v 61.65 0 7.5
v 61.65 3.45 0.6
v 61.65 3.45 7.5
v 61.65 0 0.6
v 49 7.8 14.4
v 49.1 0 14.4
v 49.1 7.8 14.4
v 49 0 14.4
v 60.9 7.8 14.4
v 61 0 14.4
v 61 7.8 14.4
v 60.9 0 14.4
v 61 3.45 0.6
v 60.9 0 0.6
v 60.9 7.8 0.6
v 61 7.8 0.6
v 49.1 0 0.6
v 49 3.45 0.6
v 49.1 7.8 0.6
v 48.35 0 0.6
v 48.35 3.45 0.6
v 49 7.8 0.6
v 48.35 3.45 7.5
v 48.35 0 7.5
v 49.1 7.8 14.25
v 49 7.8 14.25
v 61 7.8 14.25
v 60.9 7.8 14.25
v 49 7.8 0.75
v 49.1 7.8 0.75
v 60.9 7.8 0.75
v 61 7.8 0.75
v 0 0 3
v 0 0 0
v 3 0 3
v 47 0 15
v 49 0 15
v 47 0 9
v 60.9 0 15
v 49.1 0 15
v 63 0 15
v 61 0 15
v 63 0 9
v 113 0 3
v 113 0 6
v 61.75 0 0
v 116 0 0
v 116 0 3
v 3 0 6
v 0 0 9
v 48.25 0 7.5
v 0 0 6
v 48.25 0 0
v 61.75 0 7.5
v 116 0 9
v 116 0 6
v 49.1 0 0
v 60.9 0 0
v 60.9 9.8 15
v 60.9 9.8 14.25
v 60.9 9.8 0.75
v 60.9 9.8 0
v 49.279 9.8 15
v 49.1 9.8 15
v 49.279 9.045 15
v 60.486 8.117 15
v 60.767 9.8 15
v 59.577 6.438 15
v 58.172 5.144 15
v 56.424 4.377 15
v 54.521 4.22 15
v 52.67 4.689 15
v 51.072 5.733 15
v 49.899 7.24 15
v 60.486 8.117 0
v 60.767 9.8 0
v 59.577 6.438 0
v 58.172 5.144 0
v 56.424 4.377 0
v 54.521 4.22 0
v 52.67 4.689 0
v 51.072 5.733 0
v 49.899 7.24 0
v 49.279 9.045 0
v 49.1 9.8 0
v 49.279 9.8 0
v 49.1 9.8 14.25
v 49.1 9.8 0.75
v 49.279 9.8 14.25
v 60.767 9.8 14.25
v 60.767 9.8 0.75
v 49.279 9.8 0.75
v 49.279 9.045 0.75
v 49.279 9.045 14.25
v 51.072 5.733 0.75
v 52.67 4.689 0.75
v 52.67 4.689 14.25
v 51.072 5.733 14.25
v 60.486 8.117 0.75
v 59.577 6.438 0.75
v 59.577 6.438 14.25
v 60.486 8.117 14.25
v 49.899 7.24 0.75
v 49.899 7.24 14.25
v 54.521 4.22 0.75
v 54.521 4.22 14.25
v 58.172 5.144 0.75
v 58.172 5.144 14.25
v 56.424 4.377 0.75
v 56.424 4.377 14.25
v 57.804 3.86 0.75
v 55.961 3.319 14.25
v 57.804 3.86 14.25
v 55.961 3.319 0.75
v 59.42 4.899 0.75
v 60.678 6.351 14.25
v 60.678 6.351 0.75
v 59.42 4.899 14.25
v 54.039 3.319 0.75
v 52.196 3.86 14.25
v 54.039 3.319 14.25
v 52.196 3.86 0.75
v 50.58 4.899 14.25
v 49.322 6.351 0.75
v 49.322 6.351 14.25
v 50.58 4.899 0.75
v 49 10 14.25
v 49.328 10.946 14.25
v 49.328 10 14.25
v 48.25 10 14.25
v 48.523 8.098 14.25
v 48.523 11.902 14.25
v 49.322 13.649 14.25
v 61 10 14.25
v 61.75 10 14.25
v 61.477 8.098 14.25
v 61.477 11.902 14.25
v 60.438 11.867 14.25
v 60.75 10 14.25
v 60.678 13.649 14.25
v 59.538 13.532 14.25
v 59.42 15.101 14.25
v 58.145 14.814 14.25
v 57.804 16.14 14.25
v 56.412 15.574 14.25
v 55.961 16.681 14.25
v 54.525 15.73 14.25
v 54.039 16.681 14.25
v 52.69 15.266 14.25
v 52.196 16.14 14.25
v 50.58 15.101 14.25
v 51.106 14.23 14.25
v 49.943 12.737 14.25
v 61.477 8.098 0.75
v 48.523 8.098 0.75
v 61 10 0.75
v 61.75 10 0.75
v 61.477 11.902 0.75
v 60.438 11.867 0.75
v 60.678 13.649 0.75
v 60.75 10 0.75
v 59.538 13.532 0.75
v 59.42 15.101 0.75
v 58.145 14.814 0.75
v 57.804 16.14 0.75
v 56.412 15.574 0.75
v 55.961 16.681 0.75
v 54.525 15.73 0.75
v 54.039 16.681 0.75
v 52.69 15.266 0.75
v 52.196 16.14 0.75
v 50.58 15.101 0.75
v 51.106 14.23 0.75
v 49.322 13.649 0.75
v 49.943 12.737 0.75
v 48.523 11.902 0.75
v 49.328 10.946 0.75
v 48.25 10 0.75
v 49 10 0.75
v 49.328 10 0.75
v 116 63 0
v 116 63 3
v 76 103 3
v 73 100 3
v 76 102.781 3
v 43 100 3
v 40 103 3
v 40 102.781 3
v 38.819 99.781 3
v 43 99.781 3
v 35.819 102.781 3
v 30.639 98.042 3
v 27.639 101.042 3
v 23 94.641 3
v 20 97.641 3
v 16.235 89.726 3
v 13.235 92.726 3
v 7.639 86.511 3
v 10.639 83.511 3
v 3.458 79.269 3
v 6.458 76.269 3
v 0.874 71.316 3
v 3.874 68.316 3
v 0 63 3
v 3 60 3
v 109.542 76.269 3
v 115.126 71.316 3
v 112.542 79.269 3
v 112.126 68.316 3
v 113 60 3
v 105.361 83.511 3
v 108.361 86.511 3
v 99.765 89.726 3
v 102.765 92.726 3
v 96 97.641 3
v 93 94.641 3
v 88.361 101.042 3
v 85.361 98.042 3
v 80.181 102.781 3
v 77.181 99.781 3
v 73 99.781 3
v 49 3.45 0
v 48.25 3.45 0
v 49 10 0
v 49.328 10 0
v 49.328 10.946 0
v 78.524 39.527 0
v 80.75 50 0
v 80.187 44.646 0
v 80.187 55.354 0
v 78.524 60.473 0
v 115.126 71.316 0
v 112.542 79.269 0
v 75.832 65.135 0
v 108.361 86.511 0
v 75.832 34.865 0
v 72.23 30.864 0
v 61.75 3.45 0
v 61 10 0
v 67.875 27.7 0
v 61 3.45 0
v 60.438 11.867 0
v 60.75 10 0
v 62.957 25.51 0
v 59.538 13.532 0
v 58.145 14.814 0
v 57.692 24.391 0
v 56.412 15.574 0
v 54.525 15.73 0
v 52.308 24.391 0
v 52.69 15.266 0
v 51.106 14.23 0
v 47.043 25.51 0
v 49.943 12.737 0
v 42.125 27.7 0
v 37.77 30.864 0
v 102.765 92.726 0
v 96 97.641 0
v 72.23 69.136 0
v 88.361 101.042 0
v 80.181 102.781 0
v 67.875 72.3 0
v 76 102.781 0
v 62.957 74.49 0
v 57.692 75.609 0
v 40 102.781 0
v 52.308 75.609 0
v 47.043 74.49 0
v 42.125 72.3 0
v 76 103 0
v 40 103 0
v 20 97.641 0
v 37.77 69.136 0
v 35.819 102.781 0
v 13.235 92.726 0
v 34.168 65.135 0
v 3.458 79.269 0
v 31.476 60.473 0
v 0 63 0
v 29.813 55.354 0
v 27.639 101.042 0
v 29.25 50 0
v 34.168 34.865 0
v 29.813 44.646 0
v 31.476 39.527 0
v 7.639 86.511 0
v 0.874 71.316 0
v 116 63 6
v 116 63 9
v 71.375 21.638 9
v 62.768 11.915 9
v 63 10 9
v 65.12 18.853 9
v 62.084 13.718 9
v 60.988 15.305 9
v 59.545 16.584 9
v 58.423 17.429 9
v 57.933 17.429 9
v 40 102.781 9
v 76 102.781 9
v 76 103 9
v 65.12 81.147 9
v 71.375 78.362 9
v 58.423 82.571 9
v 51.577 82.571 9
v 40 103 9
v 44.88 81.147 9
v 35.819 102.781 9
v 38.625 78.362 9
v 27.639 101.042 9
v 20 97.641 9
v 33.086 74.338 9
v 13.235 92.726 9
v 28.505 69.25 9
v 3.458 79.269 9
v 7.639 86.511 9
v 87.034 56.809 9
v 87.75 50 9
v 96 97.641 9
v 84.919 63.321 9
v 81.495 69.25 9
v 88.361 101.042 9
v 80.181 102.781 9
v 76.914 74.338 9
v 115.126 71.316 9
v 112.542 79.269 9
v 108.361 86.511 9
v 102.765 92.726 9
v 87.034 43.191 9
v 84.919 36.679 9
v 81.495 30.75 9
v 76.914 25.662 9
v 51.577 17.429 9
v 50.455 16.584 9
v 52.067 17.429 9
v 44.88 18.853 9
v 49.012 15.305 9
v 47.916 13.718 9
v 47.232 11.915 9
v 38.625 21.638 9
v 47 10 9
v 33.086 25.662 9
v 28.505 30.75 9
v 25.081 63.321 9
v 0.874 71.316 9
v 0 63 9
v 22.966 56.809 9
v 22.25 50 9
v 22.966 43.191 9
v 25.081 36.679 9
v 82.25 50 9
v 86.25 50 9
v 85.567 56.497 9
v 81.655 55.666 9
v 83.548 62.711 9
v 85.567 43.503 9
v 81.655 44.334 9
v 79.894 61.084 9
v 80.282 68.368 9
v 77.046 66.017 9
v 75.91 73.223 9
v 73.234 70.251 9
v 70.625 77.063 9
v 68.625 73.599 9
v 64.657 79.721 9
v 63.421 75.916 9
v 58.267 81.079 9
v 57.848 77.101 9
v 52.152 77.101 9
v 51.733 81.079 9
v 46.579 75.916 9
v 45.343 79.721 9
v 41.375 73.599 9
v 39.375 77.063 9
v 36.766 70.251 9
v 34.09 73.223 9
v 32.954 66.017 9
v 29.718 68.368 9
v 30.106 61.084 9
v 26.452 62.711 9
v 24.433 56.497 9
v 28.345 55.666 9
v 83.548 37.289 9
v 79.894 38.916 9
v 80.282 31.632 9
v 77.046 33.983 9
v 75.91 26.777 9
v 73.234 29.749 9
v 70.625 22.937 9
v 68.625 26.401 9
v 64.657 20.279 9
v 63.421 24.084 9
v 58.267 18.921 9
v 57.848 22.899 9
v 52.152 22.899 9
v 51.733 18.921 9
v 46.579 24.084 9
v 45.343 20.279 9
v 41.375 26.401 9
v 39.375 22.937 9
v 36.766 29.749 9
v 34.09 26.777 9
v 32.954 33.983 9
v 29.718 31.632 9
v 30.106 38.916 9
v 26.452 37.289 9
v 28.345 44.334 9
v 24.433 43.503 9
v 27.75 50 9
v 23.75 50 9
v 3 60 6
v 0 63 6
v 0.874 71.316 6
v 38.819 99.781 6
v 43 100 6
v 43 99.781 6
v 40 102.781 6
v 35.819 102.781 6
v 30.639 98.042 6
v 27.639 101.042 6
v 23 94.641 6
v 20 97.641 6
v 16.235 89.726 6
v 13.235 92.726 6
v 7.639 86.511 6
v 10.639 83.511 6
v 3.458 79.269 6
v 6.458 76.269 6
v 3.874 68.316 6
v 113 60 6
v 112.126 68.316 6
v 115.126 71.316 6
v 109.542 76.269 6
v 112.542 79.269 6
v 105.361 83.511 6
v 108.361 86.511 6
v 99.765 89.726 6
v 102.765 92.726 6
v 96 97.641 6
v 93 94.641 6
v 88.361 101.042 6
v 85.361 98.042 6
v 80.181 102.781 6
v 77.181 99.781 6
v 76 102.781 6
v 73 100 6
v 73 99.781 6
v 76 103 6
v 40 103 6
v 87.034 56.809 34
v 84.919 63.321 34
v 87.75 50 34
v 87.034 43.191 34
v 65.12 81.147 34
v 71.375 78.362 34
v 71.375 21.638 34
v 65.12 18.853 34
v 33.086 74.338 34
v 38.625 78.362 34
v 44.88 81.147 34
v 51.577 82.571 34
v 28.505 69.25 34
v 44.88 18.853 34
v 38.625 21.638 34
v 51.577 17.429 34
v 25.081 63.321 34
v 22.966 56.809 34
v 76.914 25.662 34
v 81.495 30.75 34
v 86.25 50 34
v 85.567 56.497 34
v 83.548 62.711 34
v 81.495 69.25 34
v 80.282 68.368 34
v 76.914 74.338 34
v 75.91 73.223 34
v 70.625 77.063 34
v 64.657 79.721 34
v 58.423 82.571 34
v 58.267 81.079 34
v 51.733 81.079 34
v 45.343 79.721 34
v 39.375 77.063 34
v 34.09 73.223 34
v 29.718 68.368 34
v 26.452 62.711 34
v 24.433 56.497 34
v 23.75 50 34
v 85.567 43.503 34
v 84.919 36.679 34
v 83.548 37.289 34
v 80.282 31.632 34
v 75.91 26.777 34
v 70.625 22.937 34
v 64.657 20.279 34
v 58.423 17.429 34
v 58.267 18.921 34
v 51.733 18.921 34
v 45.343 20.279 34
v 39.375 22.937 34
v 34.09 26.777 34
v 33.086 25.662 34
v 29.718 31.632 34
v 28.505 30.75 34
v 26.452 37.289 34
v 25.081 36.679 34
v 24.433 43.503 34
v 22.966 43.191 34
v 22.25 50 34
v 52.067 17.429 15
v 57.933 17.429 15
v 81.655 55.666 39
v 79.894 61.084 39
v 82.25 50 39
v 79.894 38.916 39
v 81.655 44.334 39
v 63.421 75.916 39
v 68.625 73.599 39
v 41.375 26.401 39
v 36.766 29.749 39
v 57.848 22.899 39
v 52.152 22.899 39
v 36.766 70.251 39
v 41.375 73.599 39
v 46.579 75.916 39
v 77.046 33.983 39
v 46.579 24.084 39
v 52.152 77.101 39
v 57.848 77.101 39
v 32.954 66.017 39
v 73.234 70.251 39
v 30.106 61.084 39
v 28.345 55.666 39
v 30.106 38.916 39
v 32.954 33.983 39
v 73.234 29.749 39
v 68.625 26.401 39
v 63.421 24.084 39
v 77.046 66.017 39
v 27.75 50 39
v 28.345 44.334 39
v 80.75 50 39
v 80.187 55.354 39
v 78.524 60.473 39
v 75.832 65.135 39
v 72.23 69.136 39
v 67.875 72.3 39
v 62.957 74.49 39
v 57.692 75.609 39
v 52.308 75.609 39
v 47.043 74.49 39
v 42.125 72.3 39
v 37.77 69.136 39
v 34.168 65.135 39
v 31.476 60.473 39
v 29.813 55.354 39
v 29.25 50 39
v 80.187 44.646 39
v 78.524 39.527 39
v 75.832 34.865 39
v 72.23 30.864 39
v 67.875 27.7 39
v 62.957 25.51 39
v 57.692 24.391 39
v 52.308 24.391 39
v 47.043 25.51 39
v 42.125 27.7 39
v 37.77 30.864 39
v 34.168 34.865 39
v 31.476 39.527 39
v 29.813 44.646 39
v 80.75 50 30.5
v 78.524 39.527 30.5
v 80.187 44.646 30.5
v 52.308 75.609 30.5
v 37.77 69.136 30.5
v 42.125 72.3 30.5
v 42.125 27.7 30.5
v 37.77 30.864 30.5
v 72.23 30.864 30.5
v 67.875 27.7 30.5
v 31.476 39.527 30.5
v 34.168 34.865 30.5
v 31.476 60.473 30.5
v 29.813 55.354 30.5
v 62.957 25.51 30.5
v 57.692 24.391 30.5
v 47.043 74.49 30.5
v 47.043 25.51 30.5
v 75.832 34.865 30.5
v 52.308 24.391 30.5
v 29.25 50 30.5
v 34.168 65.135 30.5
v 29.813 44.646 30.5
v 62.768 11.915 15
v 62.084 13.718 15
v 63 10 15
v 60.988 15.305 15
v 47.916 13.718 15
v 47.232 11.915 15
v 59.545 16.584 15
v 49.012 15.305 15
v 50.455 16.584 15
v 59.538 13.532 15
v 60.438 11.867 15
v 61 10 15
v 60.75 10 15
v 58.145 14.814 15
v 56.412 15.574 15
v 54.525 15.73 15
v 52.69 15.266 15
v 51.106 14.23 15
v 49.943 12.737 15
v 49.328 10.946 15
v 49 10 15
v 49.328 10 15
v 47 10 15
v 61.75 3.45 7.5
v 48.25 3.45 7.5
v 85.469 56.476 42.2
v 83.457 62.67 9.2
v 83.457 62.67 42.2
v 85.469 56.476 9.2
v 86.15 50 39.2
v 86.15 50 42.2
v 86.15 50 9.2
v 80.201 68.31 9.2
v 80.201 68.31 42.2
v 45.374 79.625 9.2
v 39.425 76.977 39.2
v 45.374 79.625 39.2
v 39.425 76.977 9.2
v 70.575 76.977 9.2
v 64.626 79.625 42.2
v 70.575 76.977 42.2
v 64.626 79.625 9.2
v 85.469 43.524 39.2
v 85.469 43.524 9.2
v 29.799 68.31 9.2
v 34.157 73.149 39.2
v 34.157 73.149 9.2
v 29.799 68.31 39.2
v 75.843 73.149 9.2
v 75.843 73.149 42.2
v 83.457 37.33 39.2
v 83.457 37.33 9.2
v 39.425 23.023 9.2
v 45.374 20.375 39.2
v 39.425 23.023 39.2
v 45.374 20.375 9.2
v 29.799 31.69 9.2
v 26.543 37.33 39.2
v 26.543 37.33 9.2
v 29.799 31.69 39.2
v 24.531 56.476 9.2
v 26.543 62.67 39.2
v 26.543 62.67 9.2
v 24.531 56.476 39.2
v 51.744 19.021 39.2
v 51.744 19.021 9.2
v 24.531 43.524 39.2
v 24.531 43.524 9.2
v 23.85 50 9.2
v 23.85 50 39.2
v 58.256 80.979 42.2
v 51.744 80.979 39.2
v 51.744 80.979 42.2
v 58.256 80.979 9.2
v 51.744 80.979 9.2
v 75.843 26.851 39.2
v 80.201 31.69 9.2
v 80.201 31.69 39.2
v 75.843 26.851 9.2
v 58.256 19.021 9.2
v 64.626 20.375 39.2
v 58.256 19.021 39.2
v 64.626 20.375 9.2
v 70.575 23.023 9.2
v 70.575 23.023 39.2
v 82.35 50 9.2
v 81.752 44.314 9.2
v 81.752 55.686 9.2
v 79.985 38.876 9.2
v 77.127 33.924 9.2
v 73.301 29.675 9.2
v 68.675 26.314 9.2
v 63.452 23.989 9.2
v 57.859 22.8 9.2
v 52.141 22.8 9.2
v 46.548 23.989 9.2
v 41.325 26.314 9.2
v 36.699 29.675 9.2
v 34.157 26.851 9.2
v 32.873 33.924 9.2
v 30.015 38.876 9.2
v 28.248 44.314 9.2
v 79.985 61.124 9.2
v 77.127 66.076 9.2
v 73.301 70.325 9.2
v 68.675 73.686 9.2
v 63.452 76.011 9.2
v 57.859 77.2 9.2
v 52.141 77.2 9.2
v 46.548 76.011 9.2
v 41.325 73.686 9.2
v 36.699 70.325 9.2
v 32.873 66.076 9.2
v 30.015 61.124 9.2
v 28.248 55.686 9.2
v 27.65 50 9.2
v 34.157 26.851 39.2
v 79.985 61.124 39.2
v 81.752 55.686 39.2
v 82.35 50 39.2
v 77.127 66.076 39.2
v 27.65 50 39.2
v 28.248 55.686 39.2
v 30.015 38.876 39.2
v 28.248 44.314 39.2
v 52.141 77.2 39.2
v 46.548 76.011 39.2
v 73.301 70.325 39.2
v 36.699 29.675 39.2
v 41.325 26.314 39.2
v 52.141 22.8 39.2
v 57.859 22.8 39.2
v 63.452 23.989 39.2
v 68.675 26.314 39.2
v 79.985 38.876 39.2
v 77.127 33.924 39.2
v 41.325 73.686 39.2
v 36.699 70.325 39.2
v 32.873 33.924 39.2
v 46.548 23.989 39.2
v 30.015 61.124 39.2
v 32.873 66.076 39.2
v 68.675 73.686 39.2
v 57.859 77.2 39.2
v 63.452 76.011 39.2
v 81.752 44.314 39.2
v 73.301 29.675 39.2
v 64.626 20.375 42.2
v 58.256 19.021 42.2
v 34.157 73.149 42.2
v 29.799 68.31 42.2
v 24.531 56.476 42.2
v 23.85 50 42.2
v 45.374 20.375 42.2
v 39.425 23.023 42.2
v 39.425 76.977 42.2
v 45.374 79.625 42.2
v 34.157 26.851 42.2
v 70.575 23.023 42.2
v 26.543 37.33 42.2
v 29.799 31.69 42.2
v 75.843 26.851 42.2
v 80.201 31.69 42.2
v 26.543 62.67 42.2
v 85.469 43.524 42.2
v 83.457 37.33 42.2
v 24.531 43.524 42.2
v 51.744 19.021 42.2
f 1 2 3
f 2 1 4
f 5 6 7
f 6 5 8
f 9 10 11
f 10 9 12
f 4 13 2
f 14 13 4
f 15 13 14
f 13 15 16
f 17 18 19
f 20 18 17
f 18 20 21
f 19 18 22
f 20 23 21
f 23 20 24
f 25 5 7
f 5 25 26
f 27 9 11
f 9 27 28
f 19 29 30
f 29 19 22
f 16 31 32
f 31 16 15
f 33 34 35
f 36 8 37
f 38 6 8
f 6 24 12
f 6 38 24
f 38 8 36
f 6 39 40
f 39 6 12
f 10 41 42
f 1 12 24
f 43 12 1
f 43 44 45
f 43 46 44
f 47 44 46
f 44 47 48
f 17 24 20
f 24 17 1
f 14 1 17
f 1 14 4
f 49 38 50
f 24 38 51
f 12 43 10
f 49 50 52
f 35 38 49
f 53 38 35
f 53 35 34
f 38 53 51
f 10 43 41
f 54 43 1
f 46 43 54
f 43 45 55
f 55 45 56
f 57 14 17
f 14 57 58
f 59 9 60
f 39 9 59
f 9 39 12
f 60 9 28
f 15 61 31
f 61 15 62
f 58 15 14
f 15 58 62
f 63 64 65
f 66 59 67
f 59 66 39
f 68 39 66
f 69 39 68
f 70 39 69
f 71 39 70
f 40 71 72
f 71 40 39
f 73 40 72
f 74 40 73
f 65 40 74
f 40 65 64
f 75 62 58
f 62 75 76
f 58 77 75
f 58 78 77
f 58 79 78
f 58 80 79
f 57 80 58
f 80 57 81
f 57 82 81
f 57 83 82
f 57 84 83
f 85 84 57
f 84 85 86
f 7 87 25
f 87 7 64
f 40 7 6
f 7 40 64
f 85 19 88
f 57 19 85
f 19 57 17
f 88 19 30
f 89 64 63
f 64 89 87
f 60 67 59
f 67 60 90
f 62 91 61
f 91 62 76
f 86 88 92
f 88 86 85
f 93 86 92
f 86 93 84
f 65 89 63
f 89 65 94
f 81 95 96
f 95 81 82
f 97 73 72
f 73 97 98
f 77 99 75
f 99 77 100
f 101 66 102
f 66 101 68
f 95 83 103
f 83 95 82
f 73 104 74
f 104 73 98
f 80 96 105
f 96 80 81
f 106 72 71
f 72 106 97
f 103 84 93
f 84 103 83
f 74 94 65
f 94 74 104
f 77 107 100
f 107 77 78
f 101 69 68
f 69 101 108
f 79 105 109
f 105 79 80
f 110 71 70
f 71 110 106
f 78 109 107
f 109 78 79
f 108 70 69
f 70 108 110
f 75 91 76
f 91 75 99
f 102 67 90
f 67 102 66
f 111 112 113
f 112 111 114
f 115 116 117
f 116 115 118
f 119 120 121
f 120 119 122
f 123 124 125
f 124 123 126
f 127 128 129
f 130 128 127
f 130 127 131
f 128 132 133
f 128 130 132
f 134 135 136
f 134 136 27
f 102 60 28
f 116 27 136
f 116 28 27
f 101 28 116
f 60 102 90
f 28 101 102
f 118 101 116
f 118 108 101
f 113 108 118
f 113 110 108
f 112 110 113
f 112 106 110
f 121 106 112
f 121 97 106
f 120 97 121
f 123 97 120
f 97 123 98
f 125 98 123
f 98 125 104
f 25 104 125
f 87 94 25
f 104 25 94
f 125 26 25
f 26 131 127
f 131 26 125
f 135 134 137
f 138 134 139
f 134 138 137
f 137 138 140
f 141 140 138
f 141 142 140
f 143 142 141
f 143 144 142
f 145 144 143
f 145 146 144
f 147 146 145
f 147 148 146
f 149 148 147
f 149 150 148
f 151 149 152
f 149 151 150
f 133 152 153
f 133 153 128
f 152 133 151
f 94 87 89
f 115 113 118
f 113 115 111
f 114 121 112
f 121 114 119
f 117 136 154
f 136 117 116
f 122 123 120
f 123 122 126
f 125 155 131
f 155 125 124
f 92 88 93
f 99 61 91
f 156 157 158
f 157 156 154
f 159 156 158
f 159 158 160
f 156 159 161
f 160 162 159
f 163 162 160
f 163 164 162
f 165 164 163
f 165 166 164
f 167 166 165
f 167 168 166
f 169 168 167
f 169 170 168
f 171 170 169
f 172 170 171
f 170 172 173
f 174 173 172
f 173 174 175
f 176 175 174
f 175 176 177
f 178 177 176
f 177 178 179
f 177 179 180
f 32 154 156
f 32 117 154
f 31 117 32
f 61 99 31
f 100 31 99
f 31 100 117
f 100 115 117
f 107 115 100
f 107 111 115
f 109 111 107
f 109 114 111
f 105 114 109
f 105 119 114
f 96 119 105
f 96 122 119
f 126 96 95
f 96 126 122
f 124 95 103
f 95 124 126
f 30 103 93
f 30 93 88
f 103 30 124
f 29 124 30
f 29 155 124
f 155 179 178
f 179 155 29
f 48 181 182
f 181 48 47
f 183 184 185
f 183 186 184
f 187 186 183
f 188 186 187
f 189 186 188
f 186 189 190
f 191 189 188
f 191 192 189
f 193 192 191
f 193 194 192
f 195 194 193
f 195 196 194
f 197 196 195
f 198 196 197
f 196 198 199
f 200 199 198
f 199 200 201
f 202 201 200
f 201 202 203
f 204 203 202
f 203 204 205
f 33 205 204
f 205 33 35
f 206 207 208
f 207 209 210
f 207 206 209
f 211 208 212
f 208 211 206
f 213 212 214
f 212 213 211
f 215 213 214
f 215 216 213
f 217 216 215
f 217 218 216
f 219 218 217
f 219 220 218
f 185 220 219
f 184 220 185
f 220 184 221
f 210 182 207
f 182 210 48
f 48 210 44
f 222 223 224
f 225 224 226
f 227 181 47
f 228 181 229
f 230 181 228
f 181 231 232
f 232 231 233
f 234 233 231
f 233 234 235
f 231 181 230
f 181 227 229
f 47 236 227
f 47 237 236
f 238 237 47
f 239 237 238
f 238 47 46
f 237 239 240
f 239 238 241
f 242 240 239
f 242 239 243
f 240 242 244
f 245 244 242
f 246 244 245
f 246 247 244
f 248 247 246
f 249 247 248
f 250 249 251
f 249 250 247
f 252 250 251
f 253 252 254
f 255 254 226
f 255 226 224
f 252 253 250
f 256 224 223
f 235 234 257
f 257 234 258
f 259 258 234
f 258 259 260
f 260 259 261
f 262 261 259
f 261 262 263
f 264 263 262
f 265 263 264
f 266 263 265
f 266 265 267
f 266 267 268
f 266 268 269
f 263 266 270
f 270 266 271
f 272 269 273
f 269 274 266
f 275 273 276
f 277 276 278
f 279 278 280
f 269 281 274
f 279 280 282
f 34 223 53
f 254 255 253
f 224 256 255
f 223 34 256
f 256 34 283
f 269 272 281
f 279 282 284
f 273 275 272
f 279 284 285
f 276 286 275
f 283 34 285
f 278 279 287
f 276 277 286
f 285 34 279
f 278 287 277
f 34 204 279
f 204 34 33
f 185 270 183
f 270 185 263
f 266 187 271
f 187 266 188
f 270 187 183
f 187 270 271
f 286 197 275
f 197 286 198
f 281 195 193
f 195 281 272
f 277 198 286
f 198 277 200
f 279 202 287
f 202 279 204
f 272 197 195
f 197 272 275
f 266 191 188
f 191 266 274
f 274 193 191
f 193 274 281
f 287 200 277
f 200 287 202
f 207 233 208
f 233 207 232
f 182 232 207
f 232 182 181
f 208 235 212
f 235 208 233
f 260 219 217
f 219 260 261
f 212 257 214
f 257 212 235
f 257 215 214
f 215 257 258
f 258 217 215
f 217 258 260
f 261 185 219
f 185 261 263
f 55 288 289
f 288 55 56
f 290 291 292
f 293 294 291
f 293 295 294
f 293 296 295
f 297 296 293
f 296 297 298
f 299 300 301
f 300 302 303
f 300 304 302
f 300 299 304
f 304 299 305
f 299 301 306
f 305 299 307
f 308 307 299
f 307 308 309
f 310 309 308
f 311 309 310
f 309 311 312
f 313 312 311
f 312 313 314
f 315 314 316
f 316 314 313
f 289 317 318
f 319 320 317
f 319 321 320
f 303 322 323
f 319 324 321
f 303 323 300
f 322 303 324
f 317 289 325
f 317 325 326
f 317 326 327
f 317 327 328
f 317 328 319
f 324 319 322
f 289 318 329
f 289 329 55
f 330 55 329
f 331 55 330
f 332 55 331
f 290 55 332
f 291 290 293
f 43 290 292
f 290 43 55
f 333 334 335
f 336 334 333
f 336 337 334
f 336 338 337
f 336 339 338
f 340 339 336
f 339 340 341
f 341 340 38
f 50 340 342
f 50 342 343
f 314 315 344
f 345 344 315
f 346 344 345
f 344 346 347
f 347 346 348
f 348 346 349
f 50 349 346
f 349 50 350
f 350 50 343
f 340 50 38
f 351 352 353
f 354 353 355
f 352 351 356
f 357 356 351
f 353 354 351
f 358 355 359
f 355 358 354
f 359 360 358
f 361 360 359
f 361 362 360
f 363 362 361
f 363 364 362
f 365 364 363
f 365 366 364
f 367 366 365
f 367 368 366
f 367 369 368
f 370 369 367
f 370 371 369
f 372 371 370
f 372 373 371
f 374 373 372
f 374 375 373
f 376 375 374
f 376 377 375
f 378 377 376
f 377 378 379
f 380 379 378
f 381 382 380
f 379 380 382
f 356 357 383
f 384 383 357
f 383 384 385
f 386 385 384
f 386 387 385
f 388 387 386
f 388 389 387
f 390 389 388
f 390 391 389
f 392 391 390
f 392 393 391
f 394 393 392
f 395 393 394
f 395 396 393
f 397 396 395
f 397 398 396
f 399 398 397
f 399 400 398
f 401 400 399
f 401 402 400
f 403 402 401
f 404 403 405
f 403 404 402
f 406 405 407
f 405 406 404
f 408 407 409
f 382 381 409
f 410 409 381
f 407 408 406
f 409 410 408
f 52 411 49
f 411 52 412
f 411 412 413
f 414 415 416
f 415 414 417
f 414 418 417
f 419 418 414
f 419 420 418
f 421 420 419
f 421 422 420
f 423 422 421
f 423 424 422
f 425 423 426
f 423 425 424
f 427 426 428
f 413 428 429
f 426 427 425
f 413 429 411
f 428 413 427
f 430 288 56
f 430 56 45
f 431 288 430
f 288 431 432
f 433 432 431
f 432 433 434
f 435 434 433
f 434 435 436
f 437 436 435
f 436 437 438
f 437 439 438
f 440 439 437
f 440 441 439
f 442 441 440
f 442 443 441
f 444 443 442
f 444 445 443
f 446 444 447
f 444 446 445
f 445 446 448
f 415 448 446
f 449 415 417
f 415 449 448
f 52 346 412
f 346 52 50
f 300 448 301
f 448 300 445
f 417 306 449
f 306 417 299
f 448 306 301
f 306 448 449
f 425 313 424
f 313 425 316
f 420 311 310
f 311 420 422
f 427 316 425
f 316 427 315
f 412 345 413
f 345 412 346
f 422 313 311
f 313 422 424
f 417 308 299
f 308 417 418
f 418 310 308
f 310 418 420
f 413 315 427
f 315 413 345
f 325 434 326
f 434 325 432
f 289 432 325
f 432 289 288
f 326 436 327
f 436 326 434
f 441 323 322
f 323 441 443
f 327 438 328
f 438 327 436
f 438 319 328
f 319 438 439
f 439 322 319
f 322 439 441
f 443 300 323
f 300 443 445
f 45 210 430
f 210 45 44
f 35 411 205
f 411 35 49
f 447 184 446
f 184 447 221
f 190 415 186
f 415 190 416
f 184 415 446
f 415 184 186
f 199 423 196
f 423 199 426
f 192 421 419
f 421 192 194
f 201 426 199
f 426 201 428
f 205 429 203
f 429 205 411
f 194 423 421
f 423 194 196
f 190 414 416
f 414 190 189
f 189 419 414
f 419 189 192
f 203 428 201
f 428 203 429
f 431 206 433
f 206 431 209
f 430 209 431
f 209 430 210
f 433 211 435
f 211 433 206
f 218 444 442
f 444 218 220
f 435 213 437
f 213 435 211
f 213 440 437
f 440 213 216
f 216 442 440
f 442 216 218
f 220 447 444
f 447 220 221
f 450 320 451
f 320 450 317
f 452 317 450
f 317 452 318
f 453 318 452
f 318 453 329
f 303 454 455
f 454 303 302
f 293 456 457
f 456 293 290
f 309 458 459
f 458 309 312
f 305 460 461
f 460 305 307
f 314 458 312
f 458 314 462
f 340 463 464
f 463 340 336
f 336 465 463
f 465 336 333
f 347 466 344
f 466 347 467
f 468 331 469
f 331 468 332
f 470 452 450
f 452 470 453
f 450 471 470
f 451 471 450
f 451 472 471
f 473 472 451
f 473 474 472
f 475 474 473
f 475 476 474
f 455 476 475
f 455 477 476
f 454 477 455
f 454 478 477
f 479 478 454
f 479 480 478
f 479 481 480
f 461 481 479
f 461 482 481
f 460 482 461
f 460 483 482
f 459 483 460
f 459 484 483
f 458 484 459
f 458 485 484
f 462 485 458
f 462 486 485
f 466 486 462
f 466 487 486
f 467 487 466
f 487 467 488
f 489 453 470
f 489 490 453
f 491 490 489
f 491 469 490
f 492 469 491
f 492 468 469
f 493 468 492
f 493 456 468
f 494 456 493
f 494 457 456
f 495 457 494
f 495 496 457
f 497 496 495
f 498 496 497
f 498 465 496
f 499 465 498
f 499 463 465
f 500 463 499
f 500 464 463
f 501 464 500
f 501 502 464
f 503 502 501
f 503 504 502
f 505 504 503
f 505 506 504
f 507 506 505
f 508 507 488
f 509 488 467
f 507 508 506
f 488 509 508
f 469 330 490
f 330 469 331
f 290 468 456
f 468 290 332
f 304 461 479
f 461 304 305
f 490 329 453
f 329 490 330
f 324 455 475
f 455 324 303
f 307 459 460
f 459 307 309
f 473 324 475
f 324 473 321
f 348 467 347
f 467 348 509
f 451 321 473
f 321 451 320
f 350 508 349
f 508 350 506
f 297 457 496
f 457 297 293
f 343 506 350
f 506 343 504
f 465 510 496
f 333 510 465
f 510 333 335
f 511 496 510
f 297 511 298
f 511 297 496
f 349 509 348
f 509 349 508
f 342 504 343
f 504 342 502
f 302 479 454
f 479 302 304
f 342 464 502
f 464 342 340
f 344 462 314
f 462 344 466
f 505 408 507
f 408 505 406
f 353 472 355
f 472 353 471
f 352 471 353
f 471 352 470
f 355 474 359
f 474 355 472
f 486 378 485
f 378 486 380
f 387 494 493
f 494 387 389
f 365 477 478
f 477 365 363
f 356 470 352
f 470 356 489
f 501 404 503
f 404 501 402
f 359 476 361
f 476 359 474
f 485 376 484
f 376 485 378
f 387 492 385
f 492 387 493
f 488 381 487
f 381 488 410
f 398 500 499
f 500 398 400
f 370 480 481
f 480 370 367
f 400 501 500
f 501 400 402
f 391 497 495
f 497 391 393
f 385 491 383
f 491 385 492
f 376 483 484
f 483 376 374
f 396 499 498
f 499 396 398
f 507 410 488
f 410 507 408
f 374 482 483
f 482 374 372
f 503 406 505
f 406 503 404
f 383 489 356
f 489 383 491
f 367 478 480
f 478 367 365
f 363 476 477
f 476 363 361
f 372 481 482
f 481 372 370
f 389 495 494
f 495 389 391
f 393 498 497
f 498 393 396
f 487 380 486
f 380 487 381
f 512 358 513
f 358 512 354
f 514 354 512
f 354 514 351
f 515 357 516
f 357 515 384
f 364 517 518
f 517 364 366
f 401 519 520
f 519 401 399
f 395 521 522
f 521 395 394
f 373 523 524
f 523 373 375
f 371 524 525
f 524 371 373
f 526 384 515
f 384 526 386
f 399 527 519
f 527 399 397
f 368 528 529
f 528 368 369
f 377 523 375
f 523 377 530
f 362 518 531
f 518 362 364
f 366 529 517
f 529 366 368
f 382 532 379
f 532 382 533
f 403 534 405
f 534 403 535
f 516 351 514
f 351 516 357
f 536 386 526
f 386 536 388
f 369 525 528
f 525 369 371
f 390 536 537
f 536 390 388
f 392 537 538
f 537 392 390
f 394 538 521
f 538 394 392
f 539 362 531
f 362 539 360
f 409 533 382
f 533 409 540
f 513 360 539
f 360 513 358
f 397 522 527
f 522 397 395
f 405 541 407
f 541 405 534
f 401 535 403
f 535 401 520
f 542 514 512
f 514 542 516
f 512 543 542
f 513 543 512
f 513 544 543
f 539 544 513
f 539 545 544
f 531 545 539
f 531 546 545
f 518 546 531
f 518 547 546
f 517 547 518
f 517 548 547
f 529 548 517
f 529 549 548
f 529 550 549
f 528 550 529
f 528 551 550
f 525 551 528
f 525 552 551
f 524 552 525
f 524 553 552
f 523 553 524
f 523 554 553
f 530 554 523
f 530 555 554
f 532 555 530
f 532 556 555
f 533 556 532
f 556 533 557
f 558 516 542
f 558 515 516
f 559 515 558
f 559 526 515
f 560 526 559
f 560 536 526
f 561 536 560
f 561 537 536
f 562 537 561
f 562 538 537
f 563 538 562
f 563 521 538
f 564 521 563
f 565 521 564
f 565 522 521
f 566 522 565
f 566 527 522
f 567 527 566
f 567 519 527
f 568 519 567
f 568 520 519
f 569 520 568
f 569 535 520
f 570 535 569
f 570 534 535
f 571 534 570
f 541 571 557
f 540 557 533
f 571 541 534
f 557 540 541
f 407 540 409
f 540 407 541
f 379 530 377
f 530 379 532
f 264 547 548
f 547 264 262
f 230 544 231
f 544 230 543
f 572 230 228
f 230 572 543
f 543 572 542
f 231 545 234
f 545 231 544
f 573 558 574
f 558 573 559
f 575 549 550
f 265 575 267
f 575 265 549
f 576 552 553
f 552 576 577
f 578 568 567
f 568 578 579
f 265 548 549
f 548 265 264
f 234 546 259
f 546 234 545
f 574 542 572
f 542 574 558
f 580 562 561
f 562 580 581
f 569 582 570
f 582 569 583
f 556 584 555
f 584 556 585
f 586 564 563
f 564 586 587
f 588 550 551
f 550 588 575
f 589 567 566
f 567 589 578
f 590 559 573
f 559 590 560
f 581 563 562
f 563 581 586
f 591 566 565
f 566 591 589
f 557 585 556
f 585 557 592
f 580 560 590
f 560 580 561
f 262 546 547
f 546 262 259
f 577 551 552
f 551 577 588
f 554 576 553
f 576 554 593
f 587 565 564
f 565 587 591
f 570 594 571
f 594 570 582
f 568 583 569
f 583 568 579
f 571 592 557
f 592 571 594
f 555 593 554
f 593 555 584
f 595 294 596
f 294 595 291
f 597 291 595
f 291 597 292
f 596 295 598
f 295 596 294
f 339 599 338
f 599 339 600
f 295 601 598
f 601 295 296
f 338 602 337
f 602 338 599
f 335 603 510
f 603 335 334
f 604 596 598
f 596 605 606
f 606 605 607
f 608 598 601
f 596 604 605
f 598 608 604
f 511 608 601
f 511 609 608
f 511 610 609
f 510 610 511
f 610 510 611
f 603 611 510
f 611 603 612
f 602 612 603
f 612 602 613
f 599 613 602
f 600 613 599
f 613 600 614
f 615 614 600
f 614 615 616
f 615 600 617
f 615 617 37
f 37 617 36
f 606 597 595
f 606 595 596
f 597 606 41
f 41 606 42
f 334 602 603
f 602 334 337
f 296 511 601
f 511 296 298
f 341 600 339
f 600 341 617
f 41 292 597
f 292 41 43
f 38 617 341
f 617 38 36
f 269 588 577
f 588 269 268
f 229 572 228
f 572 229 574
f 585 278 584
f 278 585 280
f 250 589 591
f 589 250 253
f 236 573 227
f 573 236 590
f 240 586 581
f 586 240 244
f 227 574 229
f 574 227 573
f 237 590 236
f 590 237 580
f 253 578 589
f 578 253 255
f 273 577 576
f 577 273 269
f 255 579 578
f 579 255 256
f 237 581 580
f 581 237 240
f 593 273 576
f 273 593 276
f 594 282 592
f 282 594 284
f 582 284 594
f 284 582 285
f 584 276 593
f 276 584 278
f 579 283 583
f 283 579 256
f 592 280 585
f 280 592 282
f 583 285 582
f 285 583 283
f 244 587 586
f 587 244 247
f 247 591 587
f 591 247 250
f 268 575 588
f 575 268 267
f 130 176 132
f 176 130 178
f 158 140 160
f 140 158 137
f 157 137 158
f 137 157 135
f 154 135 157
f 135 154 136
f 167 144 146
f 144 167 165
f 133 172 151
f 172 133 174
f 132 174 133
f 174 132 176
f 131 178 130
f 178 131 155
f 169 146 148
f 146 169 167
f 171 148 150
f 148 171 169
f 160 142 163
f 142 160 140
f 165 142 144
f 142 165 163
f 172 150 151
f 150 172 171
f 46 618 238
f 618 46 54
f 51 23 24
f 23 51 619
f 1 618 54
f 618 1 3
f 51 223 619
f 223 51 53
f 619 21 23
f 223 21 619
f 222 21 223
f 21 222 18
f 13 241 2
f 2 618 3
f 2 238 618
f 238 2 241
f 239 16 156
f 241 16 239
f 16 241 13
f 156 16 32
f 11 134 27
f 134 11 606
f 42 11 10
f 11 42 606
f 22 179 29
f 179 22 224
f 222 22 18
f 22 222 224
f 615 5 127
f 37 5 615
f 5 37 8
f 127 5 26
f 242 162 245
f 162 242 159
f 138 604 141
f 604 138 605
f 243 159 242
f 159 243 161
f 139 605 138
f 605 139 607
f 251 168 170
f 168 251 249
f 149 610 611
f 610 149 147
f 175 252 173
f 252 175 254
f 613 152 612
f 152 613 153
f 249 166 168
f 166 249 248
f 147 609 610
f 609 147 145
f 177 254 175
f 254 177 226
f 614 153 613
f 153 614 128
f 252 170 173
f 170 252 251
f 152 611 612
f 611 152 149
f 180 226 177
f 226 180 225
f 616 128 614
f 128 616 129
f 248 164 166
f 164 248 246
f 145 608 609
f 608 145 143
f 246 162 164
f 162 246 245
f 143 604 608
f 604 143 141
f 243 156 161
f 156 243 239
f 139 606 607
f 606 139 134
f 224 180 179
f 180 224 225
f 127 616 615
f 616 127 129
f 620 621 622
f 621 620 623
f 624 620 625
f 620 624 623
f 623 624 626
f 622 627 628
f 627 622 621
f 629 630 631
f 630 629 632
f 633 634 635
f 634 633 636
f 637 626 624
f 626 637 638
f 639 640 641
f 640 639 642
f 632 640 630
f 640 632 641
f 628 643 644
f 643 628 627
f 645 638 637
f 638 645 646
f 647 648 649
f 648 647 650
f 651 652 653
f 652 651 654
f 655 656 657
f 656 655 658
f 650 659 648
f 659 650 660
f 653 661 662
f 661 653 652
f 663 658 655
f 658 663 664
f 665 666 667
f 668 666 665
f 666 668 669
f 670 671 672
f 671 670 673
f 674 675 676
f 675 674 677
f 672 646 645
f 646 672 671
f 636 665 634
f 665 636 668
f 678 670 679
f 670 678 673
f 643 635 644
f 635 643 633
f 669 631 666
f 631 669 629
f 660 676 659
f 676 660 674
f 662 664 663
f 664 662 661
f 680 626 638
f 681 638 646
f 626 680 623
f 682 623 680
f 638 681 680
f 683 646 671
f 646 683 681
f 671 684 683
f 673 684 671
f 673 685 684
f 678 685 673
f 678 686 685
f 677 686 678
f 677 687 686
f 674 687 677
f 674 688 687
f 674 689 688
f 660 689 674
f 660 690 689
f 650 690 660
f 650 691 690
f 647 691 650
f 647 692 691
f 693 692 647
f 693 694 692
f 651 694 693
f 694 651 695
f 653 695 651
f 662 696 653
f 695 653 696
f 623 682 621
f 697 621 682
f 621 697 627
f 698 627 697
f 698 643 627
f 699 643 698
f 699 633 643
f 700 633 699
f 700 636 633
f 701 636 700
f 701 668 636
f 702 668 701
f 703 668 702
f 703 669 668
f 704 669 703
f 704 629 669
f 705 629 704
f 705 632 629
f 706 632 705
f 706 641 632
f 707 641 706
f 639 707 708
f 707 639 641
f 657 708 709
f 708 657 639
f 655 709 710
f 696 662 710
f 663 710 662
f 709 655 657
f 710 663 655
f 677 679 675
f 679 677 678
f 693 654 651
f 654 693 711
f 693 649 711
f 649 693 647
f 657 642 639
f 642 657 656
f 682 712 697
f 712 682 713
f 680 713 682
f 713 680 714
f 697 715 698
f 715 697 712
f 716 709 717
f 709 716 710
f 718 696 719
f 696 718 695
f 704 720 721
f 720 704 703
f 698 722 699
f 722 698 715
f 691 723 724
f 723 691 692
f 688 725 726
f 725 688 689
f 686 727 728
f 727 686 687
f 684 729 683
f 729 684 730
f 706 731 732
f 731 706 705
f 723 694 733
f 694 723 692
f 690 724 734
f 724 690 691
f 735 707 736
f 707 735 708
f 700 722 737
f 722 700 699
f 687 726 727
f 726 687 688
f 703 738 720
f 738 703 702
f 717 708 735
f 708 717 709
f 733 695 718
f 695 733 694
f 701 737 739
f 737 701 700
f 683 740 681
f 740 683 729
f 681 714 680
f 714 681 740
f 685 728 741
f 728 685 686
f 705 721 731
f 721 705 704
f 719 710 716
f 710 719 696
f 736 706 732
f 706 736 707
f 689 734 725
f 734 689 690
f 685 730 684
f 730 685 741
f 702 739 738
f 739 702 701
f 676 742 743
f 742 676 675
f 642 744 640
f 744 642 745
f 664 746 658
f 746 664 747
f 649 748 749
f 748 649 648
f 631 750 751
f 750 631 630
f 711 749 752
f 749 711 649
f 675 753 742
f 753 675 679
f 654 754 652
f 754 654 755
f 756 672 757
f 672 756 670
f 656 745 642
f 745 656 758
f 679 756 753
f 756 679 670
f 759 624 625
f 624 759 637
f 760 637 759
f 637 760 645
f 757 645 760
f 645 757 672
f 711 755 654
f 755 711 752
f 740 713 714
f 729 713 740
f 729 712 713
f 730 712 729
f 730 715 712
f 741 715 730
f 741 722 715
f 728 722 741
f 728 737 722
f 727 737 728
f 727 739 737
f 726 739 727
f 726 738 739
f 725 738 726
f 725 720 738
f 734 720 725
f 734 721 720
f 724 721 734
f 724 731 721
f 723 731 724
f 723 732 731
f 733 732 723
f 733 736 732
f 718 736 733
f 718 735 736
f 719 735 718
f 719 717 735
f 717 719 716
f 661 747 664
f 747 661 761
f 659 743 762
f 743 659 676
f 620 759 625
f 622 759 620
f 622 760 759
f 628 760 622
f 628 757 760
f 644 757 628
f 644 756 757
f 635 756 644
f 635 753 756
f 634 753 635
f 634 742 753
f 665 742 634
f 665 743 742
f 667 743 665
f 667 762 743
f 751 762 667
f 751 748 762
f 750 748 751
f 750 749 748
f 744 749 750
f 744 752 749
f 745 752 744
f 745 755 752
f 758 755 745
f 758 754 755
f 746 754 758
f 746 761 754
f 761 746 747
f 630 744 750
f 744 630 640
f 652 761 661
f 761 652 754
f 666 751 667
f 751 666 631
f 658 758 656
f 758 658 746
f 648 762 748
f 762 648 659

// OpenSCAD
/* [Global] */

part = "all"; // [all:All parts, insert:Insert for conduit holder, cap:Cover for hole, no_cap:Hood vent mount and insert,mount:Hood vent mount, radius:radius guage]

tolerance = 0.2;

/* [Wall] */

wall_radius = 40;
wall_height = 100;
wall_width = 110;
wall_diff = 3;
wall_thickness = 3;

/* [Connector] */

inner_wall_id = 51.5;
inner_wall_od = 54.5;
inner_wall_height = 30;

outer_wall_id = 62.5;
outer_wall_od = 65.5;
outer_wall_height = 25;

/* [Hidden] */

bwallh = wall_height + wall_diff;
bwallw = wall_width + (2*wall_diff);
hwallw = wall_width / 2;
hwallh = wall_height / 2;

module wall(height, width, thickness, radius) {
    a = height - radius;
    b = width - 2* radius;
    union(){
        cube([width, a, thickness], false);
        translate([radius,a, 0]) cube([width - 2* radius, radius, thickness], false);
        translate([radius, a, 0]) cylinder(r=radius, h = thickness);
        translate([width - radius, a, 0]) cylinder(r=radius, h = thickness);
    }
}

module tube(outer, inner, height) {
    difference() {
        cylinder(d=outer, h = height);
        translate([0,0,-0.5]) cylinder(d=inner, h=height+1);
    }
}

module guage() {
    intersection() {
        cube(wall_radius+5, false);
        union() {
            translate([0,0,wall_thickness*2]) cylinder(r=wall_radius-5,h = wall_thickness);
            translate([0,0,wall_thickness]) cylinder(r=wall_radius,h = wall_thickness);
            cylinder(r=wall_radius + 5,h = wall_thickness);
        }
        
    }
}

module insert() {
    inner = 7.8;
    difference() {
        union() {
            translate([hwallw,inner/2,7.5]) cube([13.3, inner, 13.8], true);
            translate([hwallw,4.9,7.5]) cube([11.8, 9.8, 15],true);
        }
        translate([hwallw,10,-0.5]) cylinder(d=11.6, h = 16);
        translate([hwallw,10,0.75]) cylinder(d=13.5, h = 13.5);
    }
}

module mount() {
    difference(){
        union(){
            translate([0,0,6]) wall(bwallh, bwallw, 3, wall_radius);
            translate([3,0,3]) wall(100, wall_width, 3, wall_radius);
            wall(bwallh, bwallw, 3, wall_radius);
            translate([hwallw, hwallh, 9]) tube(outer_wall_od, outer_wall_id, outer_wall_height);
            translate([hwallw, hwallh, 9]) tube(inner_wall_od, inner_wall_id, inner_wall_height);
            translate([hwallw, 10, 0]) cylinder(d=16, h=15);
            translate([hwallw, 5, 7.5]) cube([16,10,15], true);
        }
        translate([hwallw,hwallh,-.5]) cylinder(d=inner_wall_id, h=inner_wall_height+1);
        translate([hwallw,10,0.75]) cylinder(d=13.5, h = 13.5);
        translate([hwallw,-1,.5]) cube([13.5, 8.9, 14],true);
        translate([hwallw,-1,-0.5]) cube([12, 11, 16],true);
        translate([hwallw,10,-0.5]) cylinder(d=11.5, h = 16);
        translate([hwallw,4.5,7.5]) cube([12, 11, 16],true);
    }
}

module cap() {
    translate([hwallw,hwallh,3 * wall_thickness + tolerance]) tube(outer_wall_id - tolerance, inner_wall_od + tolerance, inner_wall_height);
    translate([hwallw,hwallh,39.2]) cylinder(d=outer_wall_id - tolerance, h=wall_thickness);
}

if (part == "insert") {
    insert();
} else if (part == "all") {
    insert();
    mount();
    cap();
} else if (part == "no_cap") {
    insert();
    mount();
} else if (part == "cap") {
    cap();
} else if (part == "radius") {
    guage();
} else {
    mount();
}
